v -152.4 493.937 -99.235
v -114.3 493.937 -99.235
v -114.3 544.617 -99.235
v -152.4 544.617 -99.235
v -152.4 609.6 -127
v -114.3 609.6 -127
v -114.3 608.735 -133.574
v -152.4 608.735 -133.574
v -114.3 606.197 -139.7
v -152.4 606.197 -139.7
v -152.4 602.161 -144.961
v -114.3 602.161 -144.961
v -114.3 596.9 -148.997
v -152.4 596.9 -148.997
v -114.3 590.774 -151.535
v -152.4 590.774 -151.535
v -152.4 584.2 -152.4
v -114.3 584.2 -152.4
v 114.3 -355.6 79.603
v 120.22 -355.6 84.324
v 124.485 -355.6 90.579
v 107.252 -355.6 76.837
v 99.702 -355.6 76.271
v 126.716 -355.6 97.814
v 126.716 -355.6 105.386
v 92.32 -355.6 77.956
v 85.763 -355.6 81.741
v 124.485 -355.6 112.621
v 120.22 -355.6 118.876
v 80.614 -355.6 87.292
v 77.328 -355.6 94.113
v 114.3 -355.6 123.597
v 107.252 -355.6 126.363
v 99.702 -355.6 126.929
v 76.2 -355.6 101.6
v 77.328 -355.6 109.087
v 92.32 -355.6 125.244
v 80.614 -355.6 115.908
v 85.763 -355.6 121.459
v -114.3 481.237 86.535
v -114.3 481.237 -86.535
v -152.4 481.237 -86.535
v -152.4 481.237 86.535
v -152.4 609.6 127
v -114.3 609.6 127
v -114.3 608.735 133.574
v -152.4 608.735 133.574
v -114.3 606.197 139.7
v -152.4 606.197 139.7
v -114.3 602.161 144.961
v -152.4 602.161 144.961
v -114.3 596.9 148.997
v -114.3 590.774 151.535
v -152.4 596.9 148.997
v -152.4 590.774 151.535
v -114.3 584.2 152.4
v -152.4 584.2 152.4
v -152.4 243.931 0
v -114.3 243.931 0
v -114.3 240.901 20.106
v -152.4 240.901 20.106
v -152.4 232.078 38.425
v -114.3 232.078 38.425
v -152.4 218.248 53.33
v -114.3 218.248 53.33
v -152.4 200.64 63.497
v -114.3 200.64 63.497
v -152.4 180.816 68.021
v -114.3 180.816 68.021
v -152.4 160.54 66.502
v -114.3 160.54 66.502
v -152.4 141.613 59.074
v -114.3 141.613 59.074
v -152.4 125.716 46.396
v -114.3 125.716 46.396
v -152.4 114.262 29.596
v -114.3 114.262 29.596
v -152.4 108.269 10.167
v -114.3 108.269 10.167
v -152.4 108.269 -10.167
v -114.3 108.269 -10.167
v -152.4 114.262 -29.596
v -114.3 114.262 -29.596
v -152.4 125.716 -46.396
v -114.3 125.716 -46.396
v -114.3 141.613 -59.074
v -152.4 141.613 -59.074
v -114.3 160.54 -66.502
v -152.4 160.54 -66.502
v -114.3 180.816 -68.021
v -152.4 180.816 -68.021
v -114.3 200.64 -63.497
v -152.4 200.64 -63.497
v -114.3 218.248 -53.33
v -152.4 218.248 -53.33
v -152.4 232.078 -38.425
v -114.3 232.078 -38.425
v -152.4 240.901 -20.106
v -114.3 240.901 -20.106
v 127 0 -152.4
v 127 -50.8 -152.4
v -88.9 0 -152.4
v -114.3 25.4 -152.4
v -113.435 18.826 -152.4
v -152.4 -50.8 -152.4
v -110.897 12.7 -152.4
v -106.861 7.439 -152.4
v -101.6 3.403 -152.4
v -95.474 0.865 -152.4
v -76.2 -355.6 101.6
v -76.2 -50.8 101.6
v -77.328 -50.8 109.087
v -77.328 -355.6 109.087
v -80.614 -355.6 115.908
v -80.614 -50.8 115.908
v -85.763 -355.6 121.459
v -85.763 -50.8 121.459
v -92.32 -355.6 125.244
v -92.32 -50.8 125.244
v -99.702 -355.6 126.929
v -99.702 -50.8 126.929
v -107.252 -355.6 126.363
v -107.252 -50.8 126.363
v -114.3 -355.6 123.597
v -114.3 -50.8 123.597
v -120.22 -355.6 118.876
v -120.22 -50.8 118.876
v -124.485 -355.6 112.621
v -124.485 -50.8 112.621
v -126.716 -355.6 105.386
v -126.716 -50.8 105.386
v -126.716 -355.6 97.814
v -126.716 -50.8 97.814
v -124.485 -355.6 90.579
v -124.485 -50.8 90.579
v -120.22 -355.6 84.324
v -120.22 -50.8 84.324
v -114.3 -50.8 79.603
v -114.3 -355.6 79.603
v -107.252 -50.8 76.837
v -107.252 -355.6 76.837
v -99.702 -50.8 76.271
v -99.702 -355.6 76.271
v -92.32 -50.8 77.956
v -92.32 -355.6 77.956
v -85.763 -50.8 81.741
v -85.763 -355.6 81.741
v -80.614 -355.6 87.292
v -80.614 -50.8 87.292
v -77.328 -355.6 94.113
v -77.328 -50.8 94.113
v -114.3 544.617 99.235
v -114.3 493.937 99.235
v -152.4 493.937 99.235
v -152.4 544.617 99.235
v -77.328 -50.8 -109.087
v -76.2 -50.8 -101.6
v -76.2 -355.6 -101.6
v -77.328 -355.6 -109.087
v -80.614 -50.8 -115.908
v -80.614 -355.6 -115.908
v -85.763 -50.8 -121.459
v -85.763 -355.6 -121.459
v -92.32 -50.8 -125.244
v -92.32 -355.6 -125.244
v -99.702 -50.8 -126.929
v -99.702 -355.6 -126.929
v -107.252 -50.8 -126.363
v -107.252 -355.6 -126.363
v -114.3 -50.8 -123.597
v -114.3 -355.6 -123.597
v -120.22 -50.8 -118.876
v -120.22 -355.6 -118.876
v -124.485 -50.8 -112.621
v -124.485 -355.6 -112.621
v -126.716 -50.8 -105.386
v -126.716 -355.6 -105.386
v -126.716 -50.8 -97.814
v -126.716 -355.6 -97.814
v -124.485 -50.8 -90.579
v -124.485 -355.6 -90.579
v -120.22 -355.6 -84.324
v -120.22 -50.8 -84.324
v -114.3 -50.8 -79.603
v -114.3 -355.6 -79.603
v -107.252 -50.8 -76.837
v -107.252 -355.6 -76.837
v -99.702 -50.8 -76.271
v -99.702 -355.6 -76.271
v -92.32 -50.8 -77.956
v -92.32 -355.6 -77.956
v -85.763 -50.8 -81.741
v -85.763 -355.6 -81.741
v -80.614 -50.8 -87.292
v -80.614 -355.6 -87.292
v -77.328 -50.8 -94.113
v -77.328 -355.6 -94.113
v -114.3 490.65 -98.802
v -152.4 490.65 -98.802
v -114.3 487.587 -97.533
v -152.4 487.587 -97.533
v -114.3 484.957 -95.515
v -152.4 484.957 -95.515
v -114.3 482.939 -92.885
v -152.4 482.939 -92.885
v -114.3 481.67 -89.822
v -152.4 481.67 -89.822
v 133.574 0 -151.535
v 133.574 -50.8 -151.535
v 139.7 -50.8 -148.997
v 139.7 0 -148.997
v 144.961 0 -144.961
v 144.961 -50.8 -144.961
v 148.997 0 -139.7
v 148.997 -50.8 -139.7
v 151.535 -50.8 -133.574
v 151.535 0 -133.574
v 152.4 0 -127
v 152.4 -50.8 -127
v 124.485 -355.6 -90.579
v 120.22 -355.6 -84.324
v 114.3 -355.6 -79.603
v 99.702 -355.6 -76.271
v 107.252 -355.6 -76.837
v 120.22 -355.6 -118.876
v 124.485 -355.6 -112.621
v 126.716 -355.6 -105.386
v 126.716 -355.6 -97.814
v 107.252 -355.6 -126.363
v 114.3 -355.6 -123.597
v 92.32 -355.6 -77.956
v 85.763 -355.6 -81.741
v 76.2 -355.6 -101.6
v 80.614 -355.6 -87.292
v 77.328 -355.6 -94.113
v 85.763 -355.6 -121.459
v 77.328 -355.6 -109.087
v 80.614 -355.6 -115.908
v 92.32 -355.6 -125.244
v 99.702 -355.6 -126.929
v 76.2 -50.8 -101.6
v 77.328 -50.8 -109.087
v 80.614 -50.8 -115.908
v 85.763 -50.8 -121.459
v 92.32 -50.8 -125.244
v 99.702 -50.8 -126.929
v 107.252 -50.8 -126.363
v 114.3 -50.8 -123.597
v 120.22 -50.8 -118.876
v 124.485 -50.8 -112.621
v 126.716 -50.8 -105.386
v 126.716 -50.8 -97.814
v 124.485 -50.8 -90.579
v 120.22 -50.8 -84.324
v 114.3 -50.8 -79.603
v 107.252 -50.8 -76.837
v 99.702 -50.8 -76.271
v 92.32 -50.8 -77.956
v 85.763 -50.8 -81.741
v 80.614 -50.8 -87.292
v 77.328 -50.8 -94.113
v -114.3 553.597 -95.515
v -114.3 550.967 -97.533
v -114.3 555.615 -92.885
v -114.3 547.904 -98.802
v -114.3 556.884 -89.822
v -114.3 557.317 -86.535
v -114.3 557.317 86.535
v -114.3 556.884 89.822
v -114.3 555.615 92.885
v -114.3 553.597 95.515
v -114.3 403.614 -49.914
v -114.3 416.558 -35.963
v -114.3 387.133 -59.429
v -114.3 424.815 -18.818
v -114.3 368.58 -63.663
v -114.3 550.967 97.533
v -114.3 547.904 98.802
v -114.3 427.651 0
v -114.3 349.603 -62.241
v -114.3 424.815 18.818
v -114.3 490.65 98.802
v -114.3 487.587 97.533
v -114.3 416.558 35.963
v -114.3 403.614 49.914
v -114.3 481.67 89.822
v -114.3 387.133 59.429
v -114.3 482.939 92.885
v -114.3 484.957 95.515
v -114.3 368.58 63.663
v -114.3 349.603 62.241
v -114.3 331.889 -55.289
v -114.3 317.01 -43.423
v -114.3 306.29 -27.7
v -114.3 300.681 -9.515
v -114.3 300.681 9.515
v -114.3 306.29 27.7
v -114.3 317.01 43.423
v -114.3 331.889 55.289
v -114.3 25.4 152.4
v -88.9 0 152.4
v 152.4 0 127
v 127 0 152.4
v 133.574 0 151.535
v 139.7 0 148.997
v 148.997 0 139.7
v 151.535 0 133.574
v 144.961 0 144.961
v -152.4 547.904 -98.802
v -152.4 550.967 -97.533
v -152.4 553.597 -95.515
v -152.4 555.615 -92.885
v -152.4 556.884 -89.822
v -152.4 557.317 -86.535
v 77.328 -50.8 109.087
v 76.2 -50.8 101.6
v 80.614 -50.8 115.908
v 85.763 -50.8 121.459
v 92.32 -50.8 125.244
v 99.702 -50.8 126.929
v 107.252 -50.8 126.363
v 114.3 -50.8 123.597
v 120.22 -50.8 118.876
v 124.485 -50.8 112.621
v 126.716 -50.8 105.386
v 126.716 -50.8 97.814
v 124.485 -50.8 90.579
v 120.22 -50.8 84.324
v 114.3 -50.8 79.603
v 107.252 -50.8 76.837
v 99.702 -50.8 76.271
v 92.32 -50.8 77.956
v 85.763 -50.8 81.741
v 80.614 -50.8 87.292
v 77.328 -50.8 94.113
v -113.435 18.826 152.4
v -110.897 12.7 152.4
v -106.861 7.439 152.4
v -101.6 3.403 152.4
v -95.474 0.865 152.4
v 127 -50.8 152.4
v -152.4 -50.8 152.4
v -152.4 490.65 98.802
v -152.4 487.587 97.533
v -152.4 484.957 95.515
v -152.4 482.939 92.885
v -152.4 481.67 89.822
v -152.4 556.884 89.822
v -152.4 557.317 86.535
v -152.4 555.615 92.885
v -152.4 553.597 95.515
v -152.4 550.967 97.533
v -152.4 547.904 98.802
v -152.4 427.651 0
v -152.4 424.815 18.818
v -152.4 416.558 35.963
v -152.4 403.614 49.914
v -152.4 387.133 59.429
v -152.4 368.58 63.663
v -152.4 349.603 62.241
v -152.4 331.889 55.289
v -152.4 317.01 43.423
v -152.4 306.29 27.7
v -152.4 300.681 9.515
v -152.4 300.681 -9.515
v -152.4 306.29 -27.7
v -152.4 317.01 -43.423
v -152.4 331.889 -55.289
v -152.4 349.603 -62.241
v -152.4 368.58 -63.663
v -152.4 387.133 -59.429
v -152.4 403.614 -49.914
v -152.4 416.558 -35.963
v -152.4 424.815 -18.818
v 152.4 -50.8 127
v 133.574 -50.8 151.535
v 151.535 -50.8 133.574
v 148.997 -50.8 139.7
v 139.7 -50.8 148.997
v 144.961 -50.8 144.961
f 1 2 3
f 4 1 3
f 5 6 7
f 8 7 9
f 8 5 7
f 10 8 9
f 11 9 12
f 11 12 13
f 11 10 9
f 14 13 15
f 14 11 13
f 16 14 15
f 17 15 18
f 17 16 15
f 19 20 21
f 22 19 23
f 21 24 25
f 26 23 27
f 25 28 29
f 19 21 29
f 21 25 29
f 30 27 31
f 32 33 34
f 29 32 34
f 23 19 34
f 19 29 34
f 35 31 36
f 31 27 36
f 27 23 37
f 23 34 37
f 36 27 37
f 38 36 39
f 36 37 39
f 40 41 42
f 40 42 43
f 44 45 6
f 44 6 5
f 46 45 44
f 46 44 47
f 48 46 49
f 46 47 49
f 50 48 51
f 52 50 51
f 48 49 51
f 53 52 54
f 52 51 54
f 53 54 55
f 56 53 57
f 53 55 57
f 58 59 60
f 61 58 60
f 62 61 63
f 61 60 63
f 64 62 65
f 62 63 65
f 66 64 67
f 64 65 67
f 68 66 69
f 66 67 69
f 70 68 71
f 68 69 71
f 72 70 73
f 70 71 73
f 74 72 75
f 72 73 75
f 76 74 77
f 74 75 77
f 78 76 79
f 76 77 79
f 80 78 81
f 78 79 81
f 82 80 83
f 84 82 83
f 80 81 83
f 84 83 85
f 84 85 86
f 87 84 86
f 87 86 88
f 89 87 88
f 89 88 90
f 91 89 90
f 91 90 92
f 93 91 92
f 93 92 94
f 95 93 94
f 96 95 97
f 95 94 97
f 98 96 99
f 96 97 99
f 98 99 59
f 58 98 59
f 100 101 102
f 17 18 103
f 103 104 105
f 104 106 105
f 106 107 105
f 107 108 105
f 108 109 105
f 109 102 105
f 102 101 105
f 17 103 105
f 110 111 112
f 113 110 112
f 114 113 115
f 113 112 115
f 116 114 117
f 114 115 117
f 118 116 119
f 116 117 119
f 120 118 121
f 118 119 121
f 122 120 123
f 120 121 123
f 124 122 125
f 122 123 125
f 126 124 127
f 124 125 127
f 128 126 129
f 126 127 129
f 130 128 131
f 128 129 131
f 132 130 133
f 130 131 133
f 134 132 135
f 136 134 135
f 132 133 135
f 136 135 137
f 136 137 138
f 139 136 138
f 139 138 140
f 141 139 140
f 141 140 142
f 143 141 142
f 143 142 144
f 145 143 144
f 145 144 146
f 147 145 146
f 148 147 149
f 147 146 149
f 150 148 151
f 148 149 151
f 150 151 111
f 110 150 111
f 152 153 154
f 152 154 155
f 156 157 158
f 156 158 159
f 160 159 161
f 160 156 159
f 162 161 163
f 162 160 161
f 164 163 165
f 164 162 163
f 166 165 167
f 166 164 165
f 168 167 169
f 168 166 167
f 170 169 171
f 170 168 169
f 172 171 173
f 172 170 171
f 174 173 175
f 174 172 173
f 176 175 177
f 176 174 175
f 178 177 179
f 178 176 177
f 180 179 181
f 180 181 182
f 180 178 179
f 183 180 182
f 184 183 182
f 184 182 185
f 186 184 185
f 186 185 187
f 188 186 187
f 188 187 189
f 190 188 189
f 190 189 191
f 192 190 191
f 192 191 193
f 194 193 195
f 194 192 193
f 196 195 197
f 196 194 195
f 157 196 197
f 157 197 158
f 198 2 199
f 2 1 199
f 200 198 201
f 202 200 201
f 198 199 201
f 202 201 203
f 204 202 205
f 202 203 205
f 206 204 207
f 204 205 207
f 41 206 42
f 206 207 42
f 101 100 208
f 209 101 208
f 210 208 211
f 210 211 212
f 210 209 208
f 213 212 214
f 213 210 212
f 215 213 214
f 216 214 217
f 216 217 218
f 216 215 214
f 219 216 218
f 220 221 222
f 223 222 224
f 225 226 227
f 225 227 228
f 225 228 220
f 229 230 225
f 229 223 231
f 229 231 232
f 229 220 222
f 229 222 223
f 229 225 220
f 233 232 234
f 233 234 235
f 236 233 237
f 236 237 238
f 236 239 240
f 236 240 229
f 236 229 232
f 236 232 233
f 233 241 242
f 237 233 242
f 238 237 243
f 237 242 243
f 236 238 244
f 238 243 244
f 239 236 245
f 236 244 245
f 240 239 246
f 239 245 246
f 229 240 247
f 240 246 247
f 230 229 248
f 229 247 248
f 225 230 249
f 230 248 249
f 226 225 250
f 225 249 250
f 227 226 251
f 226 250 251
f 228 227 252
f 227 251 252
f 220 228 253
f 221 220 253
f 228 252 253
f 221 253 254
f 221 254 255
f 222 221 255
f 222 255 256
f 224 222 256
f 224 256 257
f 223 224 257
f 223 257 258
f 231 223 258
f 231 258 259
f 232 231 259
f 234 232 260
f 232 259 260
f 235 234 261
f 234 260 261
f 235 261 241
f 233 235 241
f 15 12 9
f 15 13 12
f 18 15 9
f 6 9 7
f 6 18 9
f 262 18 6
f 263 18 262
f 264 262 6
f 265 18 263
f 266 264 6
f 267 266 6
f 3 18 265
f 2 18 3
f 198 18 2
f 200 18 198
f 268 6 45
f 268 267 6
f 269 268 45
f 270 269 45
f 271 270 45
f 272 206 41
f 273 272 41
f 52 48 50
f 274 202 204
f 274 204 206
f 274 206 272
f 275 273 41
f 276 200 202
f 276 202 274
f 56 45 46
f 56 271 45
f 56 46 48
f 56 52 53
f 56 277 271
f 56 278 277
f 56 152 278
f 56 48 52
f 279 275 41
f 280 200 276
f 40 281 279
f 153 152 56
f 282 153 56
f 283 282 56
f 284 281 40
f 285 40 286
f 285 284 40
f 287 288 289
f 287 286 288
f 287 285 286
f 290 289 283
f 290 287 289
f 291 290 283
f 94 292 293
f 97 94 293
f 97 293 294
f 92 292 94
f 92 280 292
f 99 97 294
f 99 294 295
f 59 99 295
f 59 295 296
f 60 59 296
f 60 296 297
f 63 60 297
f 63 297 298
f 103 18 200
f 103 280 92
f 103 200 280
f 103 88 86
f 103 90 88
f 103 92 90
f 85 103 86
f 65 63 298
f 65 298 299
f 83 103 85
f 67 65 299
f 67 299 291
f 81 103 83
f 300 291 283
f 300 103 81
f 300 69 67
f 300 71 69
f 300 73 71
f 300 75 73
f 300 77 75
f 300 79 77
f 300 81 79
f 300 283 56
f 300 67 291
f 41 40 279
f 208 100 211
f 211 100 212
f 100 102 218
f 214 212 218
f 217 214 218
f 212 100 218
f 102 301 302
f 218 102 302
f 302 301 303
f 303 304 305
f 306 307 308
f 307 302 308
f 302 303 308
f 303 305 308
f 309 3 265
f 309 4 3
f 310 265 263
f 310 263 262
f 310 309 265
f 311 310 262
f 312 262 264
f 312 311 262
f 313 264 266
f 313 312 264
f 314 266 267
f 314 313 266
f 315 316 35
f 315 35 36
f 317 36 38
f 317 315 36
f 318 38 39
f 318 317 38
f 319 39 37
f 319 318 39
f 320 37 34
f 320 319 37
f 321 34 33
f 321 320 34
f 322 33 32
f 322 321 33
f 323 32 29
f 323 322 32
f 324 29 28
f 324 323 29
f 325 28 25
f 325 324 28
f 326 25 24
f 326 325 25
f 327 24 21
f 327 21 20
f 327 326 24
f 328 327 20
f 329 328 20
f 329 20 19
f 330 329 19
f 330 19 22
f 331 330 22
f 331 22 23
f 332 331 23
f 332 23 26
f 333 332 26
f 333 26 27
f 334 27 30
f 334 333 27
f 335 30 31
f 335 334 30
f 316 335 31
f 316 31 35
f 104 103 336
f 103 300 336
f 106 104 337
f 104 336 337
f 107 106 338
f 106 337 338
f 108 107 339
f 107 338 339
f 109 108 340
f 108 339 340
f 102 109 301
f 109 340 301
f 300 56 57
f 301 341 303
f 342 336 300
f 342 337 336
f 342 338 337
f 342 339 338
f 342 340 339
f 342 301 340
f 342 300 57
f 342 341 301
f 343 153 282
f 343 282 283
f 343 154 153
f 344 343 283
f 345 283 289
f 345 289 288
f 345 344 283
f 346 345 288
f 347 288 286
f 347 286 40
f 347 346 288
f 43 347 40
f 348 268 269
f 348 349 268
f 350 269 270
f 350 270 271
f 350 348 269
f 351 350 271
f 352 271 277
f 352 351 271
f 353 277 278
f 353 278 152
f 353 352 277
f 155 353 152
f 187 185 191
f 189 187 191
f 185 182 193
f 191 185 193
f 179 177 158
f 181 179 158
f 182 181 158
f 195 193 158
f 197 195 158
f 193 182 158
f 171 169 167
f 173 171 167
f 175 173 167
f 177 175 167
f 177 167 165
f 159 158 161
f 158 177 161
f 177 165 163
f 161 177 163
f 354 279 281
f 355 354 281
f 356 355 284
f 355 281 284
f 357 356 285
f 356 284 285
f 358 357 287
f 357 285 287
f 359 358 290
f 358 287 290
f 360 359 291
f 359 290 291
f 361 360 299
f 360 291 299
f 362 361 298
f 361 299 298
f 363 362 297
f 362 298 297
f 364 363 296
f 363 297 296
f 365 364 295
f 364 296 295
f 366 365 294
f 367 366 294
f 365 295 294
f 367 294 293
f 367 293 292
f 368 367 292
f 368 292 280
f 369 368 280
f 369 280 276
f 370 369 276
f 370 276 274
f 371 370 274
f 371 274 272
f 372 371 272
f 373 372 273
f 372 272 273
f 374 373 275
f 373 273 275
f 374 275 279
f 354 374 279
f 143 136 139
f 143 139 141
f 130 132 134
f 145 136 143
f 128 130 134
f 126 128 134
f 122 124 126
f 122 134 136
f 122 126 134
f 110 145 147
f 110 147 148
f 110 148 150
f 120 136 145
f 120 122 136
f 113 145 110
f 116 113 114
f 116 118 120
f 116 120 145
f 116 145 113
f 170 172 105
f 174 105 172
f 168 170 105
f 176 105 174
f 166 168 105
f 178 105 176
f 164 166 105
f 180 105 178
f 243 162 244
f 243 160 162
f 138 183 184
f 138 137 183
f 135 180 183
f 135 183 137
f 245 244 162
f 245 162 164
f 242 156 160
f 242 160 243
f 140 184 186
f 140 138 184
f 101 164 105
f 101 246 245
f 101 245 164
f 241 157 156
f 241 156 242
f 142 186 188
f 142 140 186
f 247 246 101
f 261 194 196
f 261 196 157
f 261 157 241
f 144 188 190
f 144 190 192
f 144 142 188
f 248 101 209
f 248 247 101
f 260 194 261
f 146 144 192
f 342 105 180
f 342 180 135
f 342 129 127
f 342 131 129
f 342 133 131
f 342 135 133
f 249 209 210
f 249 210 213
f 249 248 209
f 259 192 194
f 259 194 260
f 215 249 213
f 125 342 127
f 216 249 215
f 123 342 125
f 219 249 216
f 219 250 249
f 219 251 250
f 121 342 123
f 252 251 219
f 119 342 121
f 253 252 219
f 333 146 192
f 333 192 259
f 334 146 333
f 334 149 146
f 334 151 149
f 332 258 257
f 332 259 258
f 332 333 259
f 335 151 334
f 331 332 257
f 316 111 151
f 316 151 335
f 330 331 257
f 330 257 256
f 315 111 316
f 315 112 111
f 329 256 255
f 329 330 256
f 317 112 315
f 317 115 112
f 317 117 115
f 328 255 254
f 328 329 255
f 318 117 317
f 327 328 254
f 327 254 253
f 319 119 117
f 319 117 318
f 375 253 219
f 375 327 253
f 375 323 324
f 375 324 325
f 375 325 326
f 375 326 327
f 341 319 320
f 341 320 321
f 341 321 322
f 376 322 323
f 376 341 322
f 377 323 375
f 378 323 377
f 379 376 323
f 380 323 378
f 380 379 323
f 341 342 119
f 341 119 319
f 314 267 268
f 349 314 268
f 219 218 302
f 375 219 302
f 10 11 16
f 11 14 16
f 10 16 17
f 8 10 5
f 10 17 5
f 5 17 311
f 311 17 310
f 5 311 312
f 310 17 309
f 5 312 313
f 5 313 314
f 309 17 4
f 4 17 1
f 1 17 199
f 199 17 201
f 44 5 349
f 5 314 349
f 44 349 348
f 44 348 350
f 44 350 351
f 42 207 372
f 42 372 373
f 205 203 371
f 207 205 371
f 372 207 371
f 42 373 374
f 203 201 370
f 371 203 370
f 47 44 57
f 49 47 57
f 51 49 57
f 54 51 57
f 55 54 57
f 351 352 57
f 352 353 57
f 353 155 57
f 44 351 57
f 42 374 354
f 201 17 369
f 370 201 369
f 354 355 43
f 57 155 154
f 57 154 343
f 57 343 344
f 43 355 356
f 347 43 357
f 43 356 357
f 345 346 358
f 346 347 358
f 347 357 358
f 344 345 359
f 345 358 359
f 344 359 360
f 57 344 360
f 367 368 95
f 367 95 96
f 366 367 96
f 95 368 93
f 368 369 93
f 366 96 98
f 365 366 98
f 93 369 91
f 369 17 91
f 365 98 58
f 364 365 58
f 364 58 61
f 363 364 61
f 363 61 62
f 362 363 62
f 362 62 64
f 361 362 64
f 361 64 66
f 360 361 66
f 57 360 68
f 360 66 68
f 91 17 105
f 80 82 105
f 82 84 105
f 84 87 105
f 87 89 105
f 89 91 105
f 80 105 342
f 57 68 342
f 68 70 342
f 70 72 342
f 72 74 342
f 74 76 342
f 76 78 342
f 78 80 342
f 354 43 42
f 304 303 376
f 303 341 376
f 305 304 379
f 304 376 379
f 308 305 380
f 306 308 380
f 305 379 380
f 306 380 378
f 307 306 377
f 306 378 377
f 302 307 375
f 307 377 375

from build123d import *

# Parameters (mm, degrees)
F0_W      = 304.8
F0_H      = 304.8
F1_DEPTH  = 50.8
F2_R      = 25.4
F3_DEPTH  = 304.8
F6_W      = 38.1
F6_H      = 304.8
F7_DEPTH  = 609.6
F8_R      = 25.4
F9_R      = 25.4
F10_R     = 25.4
F11_R     = 68.2122039911
F12_DEPTH = 38.1
F13_R     = 63.8417796902
F14_DEPTH = 38.1
F15_W     = 76.0798454285
F15_H     = 198.4691917896
F16_DEPTH = 38.1
F17_R     = 12.7


with BuildPart() as f1:
    # F0 (on Front) → F1 (new body)
    with BuildSketch(Plane.XZ):
        Rectangle(F0_W, F0_H)
    extrude(amount=F1_DEPTH)

    # F2 (on face) → F3 (join)
    with BuildSketch(Plane.XZ.offset(50.8)):
        with Locations((-101.6, 101.6)):
            Circle(F2_R)
    extrude(amount=F3_DEPTH)


with BuildPart() as f4_1:
    # F4: instance of F1
    add(f1.part.mirror(Plane.XY))


with BuildPart() as f1_1:
    add(f1.part)

    add(f4_1.part)  # F5 merges F4_1
    # F5: F1, F4_1 across plane
    add(f1.part.mirror(Plane.YZ))
    add(f4_1.part.mirror(Plane.YZ))

    # F6 (on face) → F7 (join)
    with BuildSketch(Plane(origin=(0, 0, 0), x_dir=(-1, 0, 0), z_dir=(0, 1, 0))):
        with Locations((133.35, 0)):
            Rectangle(F6_W, F6_H)
    extrude(amount=F7_DEPTH)

    # F8
    f8_edges = [f1_1.edges().sort_by_distance(p)[0] for p in [
        (-133.35, 609.6, 152.4),
        (-133.35, 609.6, -152.4),
    ]]
    fillet(f8_edges, radius=F8_R)

    # F9
    f9_edges = [f1_1.edges().sort_by_distance(p)[0] for p in [
        (-114.3, 0, 0),
        (152.4, -25.4, 152.4),
    ]]
    fillet(f9_edges, radius=F9_R)

    # F10
    f10_edges = [f1_1.edges().sort_by_distance(p)[0] for p in [
        (152.4, -25.4, -152.4),
    ]]
    fillet(f10_edges, radius=F10_R)

    # F11 (on face) → F12 (cut, through all)
    with BuildSketch(Plane.YZ.offset(-114.3)):
        with Locations((175.7188588381, 0)):
            Circle(F11_R)
    extrude(amount=-F12_DEPTH, mode=Mode.SUBTRACT)

    # F13 (on face) → F14 (cut, through all)
    with BuildSketch(Plane.YZ.offset(-114.3)):
        with Locations((363.809466362, 0)):
            Circle(F13_R)
    extrude(amount=-F14_DEPTH, mode=Mode.SUBTRACT)

    # F15 (on face) → F16 (cut, through all)
    with BuildSketch(Plane.YZ.offset(-114.3)):
        with Locations((519.2769765854, 0)):
            Rectangle(F15_W, F15_H)
    extrude(amount=-F16_DEPTH, mode=Mode.SUBTRACT)

    # F17
    f17_edges = [f1_1.edges().sort_by_distance(p)[0] for p in [
        (-133.35, 557.316899, -99.234596),
        (-133.35, 557.316899, 99.234596),
        (-133.35, 481.237054, 99.234596),
        (-133.35, 481.237054, -99.234596),
    ]]
    fillet(f17_edges, radius=F17_R)


solid = f1_1.part
